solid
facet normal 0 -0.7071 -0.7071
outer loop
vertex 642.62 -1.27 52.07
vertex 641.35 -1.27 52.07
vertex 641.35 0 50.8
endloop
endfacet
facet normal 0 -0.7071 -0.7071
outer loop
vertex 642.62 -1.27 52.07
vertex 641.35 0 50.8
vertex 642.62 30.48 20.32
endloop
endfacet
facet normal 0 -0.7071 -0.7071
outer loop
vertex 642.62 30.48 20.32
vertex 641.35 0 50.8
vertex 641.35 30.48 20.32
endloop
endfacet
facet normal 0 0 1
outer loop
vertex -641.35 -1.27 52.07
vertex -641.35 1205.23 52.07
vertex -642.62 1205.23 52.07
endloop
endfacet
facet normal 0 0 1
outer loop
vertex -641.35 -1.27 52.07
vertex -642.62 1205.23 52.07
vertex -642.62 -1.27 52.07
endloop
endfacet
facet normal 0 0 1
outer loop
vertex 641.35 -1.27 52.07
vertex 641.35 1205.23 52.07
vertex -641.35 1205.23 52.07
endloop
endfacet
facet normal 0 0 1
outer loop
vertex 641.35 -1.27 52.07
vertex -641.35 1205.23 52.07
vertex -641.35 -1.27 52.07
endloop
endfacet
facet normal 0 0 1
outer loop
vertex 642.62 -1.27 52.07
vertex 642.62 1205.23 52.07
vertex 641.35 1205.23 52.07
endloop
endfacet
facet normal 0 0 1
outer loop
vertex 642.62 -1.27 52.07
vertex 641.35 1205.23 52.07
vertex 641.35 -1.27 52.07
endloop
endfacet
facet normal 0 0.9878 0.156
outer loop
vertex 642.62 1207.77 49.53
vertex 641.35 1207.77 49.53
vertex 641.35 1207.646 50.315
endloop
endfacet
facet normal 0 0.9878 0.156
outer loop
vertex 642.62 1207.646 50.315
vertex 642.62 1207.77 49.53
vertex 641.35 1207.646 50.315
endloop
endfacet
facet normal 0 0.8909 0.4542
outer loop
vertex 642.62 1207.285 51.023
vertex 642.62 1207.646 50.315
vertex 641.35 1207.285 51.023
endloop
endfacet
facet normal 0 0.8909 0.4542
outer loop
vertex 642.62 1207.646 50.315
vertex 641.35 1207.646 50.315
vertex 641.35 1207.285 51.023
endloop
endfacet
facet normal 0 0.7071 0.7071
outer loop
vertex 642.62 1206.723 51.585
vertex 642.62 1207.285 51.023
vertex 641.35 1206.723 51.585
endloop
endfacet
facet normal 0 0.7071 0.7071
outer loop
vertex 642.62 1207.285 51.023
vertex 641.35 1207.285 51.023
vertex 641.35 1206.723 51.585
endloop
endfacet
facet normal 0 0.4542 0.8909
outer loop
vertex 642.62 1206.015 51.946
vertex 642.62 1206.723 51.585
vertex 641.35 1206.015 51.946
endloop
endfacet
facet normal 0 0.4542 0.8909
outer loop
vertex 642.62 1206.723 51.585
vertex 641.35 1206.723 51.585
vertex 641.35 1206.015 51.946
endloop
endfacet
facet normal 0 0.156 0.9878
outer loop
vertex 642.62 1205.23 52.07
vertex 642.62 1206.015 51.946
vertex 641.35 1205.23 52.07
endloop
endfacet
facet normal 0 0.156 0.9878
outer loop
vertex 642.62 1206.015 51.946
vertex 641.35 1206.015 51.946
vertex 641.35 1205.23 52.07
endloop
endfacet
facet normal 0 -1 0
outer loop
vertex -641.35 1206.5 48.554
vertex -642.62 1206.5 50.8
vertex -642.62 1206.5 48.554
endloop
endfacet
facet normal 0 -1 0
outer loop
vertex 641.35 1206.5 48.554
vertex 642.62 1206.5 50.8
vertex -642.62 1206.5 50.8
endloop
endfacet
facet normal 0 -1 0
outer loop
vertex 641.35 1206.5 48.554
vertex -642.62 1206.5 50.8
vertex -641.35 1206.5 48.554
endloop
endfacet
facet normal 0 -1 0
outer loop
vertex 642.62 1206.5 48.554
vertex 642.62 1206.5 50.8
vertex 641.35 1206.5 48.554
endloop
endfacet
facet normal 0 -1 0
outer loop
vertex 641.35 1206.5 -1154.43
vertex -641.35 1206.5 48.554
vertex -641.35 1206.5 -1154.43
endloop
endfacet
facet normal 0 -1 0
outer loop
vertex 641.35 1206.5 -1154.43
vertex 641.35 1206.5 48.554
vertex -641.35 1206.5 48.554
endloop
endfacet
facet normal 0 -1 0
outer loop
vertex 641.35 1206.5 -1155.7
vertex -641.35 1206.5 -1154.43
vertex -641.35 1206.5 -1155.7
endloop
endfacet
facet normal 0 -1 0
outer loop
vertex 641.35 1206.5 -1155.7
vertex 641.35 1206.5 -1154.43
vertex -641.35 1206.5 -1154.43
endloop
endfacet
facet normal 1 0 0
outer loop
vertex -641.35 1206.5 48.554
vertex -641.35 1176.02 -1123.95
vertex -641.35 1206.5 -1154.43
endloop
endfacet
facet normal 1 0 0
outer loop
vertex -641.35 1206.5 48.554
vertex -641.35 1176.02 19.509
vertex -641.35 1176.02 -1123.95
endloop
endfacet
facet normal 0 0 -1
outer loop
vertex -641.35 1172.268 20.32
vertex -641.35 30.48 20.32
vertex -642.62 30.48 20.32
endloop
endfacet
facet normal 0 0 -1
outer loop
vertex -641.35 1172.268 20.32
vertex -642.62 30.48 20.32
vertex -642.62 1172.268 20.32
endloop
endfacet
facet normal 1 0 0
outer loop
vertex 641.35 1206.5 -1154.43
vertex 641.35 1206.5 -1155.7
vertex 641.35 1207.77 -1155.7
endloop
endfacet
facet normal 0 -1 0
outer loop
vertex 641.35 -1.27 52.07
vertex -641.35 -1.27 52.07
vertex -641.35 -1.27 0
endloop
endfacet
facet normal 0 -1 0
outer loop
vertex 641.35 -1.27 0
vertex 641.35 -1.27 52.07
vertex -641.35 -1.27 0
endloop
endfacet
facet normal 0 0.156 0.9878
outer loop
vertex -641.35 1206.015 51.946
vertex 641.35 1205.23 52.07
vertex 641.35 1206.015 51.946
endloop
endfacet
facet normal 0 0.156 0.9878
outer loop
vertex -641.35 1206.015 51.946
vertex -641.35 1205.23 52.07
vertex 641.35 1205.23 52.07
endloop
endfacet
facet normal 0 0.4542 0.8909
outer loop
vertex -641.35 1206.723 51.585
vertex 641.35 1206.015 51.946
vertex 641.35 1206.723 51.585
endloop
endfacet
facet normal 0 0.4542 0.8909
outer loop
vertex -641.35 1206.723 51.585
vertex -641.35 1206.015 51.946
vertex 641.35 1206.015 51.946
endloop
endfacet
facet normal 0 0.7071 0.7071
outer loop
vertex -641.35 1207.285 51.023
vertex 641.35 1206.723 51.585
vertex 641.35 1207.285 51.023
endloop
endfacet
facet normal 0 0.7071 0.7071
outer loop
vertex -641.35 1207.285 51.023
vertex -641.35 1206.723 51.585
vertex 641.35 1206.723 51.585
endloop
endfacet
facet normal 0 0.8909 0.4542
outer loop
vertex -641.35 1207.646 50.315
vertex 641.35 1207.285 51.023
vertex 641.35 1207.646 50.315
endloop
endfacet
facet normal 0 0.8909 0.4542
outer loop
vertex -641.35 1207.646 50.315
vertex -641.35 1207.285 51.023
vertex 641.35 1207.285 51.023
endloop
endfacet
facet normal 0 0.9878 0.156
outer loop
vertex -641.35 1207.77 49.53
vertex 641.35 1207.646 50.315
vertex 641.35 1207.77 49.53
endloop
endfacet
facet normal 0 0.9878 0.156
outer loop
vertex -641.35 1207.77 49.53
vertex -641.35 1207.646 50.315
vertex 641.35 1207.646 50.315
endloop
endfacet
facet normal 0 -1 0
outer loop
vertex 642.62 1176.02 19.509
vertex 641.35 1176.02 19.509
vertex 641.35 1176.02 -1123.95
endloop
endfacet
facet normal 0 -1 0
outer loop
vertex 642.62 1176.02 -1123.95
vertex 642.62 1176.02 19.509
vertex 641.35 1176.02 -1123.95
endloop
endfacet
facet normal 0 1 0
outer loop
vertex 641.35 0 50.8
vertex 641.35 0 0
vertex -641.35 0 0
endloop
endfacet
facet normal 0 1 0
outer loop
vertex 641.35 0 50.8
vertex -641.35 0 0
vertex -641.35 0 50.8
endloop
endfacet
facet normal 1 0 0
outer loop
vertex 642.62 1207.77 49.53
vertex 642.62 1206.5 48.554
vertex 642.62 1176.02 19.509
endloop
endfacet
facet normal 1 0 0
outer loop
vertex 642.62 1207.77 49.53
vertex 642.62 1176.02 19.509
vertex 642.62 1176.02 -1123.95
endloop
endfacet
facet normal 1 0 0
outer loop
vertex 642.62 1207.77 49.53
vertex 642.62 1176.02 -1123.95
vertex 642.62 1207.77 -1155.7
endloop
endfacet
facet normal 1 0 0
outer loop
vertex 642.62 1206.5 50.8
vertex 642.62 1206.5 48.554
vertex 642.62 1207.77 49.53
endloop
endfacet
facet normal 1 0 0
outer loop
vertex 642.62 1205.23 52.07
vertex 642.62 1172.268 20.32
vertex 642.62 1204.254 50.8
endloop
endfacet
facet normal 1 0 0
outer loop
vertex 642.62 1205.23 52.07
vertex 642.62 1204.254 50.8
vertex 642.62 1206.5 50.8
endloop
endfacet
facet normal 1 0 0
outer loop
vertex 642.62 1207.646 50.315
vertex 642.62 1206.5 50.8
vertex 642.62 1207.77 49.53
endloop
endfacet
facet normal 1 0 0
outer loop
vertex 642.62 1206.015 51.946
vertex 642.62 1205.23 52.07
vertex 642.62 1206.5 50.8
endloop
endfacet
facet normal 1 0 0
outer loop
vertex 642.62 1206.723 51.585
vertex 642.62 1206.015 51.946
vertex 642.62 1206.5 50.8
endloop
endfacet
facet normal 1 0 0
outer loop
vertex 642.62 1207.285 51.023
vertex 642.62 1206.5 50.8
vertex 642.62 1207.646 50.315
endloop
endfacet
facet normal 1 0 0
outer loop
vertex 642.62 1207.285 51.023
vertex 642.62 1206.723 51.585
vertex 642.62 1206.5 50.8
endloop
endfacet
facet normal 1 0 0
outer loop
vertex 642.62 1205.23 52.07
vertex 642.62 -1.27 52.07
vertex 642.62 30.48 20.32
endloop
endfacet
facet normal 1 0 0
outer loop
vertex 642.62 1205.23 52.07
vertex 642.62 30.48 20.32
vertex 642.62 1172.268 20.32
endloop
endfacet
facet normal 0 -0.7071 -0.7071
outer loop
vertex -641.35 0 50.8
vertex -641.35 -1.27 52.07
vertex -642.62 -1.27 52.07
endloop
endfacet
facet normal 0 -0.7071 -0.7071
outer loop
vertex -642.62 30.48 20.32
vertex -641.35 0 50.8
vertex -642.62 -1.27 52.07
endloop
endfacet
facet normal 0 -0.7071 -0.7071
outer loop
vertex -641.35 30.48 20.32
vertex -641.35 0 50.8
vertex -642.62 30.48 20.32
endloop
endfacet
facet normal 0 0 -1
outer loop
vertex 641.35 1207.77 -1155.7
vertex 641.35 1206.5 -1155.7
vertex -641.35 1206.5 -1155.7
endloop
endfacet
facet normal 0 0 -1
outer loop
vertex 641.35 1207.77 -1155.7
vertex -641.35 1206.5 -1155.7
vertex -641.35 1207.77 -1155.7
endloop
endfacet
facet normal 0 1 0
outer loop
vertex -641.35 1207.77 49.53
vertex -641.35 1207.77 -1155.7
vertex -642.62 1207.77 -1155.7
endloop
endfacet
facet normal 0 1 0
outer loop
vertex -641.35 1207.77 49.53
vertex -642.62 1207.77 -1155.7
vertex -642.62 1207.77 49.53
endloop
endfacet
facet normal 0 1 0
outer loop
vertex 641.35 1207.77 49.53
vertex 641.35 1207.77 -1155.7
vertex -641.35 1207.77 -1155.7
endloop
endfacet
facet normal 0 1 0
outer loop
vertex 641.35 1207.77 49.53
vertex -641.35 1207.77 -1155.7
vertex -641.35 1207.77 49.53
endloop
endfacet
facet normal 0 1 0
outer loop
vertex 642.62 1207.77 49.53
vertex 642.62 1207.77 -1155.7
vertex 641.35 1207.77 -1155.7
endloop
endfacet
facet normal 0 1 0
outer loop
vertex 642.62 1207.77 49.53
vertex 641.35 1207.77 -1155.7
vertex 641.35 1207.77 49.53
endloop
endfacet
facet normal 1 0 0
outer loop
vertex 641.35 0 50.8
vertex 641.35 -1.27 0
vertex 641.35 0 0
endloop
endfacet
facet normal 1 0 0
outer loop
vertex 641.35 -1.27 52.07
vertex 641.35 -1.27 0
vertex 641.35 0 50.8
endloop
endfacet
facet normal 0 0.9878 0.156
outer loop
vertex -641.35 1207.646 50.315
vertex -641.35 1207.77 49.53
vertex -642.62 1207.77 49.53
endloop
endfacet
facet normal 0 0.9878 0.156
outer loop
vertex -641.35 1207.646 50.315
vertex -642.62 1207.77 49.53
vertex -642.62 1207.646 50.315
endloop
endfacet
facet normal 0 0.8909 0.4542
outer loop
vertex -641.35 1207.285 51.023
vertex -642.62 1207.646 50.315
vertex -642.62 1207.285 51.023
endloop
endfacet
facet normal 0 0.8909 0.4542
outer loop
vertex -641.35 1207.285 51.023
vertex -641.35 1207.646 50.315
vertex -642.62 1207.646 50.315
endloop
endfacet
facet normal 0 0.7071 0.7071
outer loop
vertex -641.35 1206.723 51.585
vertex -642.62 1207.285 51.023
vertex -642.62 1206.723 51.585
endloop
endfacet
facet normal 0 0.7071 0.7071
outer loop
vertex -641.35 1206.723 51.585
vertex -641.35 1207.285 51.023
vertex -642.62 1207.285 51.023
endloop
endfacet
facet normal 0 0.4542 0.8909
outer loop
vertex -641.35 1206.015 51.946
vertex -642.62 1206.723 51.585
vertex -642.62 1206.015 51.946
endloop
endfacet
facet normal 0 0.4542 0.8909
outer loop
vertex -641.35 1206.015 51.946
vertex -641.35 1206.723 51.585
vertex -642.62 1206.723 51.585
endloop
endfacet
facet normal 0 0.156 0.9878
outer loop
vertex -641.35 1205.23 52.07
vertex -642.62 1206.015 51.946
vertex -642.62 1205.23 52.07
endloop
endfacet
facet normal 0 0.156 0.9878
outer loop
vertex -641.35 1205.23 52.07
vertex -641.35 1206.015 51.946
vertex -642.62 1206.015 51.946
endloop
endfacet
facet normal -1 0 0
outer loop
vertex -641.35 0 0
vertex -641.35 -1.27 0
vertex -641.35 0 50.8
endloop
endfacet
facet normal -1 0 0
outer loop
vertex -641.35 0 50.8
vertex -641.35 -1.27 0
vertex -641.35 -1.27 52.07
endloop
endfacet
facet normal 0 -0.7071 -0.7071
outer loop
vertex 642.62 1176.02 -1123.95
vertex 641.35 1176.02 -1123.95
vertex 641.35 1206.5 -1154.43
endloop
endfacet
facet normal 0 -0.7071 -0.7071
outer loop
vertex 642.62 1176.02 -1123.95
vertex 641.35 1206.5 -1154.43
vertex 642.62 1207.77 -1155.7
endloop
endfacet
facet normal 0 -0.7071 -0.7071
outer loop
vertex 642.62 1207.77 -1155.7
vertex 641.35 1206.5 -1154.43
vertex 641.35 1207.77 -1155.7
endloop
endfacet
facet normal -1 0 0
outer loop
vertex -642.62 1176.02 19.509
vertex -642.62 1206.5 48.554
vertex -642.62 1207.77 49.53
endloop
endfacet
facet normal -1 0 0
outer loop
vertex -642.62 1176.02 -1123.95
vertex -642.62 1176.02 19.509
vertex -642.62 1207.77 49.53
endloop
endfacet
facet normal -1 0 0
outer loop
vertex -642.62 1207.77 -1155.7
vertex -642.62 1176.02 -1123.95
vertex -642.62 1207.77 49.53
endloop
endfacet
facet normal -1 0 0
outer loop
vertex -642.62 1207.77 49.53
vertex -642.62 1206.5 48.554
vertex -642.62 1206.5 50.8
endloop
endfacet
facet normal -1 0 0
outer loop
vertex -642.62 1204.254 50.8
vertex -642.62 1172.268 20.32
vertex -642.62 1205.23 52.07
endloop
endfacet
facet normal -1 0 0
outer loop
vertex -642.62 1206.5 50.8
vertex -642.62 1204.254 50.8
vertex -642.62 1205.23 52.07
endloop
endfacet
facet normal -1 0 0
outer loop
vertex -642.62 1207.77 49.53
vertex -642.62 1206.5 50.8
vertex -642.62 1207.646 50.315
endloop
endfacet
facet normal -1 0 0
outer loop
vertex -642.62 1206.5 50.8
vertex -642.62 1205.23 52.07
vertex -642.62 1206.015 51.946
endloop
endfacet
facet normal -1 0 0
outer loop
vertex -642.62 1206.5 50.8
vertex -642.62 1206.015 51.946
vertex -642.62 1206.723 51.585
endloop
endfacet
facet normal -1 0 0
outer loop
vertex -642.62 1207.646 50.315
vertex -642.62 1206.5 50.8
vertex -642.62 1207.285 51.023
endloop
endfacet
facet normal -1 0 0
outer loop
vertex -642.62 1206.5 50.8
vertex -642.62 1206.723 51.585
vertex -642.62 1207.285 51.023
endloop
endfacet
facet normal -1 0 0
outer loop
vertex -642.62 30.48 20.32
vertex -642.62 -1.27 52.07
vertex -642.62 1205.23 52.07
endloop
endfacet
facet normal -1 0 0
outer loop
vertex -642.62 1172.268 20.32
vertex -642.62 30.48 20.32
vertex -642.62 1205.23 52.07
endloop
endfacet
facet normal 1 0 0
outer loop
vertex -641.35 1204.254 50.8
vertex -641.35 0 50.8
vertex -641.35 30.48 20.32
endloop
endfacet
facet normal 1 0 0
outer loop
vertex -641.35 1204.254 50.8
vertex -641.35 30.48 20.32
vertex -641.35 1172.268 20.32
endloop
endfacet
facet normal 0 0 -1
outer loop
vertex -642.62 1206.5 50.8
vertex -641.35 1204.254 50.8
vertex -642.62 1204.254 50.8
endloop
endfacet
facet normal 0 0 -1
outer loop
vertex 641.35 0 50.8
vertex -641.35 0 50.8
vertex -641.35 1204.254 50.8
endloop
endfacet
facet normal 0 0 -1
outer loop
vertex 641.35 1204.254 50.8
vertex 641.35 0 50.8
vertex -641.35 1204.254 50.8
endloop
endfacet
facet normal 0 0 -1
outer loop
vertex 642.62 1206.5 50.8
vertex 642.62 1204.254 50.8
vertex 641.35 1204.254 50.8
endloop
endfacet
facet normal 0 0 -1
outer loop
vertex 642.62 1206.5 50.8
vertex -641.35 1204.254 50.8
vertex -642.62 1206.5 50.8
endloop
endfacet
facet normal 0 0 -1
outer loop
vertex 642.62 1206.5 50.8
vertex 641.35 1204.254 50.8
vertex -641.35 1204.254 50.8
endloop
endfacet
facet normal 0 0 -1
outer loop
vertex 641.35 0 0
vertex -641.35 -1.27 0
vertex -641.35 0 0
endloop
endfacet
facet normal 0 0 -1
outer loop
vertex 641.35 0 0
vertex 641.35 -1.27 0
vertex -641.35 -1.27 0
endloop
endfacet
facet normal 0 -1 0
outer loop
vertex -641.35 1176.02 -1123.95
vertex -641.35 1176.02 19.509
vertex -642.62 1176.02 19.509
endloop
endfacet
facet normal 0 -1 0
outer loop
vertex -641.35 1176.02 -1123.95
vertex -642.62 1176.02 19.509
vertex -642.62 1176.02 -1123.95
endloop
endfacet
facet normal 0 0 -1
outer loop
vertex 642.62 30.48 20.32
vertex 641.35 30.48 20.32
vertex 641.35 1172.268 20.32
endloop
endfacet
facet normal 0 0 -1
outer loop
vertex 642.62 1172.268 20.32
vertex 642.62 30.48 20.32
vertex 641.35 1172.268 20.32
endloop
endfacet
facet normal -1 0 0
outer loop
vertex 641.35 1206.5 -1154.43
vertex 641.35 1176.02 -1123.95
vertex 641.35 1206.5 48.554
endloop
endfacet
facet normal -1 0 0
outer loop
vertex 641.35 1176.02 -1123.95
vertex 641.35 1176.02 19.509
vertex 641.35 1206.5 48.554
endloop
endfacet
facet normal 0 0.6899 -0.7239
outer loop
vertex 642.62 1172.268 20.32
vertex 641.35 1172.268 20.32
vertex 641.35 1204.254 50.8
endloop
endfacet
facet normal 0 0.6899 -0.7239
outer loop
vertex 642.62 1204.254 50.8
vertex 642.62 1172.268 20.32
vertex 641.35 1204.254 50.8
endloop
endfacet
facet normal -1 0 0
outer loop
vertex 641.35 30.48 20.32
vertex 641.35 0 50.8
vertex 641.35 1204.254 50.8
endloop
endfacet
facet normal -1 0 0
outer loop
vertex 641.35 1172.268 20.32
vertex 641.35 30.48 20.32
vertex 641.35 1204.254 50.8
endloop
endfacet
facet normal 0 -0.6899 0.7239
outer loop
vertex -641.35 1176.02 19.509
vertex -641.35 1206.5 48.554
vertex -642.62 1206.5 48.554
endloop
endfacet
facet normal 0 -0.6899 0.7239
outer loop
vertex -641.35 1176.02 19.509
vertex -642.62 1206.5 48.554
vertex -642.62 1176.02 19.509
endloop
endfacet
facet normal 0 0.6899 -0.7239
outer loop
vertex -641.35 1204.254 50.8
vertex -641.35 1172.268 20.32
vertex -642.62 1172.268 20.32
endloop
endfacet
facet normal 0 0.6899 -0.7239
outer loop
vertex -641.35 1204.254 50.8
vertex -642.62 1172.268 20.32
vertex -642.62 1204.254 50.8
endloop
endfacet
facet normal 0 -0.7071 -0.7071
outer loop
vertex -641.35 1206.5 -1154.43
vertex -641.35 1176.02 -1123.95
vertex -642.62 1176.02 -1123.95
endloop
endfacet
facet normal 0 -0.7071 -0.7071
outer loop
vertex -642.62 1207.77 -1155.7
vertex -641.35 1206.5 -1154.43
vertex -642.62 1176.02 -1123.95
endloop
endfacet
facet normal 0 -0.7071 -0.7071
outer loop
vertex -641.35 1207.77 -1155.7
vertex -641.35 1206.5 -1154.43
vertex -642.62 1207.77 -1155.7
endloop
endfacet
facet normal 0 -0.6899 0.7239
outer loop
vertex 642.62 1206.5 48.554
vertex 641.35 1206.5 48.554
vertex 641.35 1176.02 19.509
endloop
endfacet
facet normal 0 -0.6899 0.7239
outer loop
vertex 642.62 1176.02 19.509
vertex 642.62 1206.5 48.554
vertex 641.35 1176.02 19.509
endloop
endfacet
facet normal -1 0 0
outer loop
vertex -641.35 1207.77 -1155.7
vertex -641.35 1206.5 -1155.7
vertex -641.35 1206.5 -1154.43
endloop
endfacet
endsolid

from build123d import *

# Parameters (mm, degrees)
F1_DEPTH = 641.35
F2_R     = 2.54
F4_DEPTH = 1.27


# Not quite as in the source:
# - a pattern or mirror of a feature is missing from the dataset's text; its kind, count and spacing are read off the source's solid


with BuildPart() as f1:
    # F0 (on Right) → F1 (new body, symmetric)
    with BuildSketch(Plane.YZ):
        Polygon((-1.27, 0), (0, 0), (0, 50.8), (1206.5, 50.8), (1206.5, -1155.7), (1207.77, -1155.7), (1207.77, 52.07), (-1.27, 52.07), align=None)
    extrude(amount=F1_DEPTH, both=True)

    # F2
    f2_edges = [f1.edges().sort_by_distance(p)[0] for p in [
        (0, 1207.77, 52.07),
    ]]
    fillet(f2_edges, radius=F2_R)

    # F3 (on face) → F4 (join)
    with BuildSketch(Plane.YZ.offset(641.35)):
        with BuildLine():
            Line((1205.23, 52.07), (-1.27, 52.07))
            Line((-1.27, 52.07), (30.48, 20.32))
            Line((30.48, 20.32), (1172.2684317215, 20.32))
            Line((1172.2684317215, 20.32), (1204.2542837185, 50.8))
            Line((1204.2542837185, 50.8), (1206.5, 50.8))
            Line((1206.5, 50.8), (1206.5, 48.5542837185))
            Line((1206.5, 48.5542837185), (1176.02, 19.5092421769))
            Line((1176.02, 19.5092421769), (1176.02, -1123.95))
            Line((1176.02, -1123.95), (1207.77, -1155.7))
            Line((1207.77, -1155.7), (1207.77, -1123.95))
            Line((1207.77, -1123.95), (1207.77, 49.53))
            ThreePointArc((1207.77, 49.53), (1207.0260512242, 51.3260512242), (1205.23, 52.07))
        make_face()
    f4 = extrude(amount=F4_DEPTH)

    # F4_copies: F4 across plane
    add(f4.mirror(Plane(origin=(0, 0, 0), x_dir=(0, 0, -1), z_dir=(-1, 0, 0))))


solid = f1.part
